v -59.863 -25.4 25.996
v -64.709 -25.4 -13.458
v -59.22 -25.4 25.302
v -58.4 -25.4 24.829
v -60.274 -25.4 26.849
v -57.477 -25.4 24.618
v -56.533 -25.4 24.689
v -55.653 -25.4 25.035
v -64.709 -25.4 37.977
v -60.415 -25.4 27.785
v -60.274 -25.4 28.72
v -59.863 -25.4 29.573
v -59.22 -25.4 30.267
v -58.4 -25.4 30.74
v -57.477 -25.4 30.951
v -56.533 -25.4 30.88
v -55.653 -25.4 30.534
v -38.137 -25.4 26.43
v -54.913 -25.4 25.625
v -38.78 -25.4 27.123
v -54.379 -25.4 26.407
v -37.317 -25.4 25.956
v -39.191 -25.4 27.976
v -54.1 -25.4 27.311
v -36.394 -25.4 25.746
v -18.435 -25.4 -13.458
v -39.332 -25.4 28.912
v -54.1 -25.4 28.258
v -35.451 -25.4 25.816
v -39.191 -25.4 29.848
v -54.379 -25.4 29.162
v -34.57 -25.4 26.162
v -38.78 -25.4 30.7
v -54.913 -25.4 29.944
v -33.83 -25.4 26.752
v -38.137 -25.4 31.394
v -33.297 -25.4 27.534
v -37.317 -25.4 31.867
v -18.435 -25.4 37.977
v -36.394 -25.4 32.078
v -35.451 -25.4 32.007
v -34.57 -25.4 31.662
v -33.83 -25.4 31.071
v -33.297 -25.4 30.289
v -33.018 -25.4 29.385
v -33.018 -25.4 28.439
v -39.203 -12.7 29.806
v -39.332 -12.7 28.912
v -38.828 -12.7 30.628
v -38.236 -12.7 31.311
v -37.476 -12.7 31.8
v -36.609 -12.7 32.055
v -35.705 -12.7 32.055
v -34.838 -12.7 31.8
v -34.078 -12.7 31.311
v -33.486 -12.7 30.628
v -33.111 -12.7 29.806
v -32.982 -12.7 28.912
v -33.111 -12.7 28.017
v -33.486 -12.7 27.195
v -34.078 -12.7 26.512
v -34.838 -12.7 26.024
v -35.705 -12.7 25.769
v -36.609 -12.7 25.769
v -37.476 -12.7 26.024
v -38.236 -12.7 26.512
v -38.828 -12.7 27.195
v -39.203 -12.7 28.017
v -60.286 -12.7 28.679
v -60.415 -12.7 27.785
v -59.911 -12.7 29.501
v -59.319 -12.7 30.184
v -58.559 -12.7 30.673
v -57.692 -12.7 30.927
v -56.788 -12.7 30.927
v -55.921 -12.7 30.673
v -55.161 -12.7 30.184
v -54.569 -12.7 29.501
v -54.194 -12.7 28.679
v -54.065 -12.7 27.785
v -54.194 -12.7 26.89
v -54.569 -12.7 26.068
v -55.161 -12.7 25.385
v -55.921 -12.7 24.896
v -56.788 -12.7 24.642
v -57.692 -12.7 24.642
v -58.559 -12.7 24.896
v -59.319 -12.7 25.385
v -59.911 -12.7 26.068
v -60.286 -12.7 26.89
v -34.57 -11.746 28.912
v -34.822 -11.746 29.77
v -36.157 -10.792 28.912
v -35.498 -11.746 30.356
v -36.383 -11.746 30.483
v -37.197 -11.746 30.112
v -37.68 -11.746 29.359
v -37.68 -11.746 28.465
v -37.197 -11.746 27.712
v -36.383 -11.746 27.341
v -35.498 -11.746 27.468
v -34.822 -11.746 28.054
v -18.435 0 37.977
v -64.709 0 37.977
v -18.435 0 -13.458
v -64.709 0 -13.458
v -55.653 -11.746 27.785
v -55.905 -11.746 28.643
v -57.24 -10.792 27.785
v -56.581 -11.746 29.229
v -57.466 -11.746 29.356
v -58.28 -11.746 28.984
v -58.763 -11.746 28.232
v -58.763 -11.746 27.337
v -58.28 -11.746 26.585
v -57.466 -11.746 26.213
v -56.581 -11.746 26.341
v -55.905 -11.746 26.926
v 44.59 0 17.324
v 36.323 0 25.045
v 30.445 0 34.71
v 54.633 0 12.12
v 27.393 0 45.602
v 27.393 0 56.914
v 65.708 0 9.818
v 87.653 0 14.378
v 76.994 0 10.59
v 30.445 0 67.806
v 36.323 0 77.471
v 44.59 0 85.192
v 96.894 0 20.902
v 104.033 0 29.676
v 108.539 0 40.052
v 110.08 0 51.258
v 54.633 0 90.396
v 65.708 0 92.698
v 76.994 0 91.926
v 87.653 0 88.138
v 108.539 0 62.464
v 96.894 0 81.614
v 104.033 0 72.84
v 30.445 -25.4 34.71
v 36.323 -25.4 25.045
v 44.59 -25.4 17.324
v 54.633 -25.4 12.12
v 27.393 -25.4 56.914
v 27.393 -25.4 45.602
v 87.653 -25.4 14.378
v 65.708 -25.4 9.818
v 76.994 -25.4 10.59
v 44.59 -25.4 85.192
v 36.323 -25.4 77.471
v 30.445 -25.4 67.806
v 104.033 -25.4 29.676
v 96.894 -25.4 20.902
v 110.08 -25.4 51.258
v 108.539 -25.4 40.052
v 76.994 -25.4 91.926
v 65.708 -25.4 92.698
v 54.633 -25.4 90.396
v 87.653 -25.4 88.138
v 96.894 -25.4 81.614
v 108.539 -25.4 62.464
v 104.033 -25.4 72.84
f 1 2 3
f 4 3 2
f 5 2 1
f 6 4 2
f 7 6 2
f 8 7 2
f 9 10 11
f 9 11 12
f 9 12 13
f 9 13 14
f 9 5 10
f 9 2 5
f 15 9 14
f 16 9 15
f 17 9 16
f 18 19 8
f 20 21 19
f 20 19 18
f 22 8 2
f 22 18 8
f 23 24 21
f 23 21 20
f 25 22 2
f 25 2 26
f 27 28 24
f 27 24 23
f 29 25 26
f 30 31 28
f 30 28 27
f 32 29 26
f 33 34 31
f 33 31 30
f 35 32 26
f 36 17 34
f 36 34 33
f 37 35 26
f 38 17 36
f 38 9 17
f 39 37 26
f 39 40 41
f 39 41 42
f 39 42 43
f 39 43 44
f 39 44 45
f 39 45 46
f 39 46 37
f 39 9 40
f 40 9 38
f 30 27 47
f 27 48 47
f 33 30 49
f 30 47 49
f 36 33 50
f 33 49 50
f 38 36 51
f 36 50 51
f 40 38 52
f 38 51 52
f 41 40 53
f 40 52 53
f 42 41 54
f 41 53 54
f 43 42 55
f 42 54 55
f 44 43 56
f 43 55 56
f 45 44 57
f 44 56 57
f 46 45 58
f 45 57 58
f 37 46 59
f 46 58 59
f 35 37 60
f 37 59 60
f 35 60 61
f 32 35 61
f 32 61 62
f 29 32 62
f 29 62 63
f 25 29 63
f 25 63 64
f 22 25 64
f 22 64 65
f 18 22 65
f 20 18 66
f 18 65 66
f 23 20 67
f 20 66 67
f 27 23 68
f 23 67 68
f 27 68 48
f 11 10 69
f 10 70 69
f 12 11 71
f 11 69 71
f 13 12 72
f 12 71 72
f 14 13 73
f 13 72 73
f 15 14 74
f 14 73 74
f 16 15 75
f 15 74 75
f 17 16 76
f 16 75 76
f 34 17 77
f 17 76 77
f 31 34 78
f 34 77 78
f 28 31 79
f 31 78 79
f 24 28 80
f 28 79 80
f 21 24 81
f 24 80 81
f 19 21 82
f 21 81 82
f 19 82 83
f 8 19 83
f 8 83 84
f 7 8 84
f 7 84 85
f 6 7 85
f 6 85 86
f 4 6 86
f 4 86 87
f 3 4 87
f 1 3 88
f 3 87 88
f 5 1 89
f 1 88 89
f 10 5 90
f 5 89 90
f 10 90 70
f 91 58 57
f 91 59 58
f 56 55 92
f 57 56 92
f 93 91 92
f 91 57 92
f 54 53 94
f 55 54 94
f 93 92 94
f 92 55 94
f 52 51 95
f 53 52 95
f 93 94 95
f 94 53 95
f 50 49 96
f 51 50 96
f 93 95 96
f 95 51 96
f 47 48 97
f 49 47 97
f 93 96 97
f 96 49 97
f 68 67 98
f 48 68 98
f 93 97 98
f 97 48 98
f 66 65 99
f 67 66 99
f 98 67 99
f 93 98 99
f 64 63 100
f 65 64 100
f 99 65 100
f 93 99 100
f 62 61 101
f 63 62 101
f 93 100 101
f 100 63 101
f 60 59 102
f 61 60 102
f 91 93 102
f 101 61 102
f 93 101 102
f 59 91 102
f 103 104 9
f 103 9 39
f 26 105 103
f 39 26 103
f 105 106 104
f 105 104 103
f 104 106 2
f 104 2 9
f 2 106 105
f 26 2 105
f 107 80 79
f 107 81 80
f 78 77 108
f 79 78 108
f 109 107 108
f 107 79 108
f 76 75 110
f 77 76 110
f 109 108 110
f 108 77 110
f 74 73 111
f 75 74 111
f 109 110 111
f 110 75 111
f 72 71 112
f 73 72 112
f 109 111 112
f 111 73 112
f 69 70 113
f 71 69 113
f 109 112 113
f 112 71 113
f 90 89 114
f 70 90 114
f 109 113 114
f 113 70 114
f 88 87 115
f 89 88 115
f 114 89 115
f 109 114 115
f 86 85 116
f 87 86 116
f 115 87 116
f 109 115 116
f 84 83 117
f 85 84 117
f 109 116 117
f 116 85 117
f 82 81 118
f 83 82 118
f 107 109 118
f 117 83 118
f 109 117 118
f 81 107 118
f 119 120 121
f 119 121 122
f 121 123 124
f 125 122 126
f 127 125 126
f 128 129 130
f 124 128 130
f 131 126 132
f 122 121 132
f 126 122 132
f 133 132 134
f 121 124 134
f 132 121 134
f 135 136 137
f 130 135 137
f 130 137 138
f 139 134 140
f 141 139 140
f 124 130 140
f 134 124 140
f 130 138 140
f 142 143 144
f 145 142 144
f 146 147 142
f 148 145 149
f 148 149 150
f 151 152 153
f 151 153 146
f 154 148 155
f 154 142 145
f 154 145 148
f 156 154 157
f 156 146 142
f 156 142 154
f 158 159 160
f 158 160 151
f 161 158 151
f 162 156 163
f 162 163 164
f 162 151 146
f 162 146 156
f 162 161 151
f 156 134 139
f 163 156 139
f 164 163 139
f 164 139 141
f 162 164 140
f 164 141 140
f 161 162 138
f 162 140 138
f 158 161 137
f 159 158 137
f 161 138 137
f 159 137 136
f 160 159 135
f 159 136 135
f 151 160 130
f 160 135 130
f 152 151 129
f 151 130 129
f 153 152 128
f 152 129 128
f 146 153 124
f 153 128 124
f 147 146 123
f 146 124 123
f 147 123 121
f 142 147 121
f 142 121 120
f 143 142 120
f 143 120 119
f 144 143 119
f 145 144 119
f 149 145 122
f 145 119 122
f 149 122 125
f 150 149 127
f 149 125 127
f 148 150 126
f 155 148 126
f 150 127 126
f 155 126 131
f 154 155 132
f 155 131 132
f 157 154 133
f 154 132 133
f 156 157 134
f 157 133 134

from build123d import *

# Parameters (mm, degrees)
F0_W     = 46.2730694562
F0_H     = 51.4349984005
F1_DEPTH = 25.4
F3_D     = 6.35
F3_DEPTH = 12.7
F3_TIP   = 1.9077324654
F4_R     = 41.5364849157
F5_DEPTH = 25.4


with BuildPart() as f1:
    # F0 (on Front) → F1 (new body)
    with BuildSketch(Plane.XZ):
        with Locations((-41.5720185265, 12.2595964931)):
            Rectangle(F0_W, F0_H)
    extrude(amount=F1_DEPTH)

    # F3
    with Locations(Plane.XZ.offset(25.4)):
        with Locations((-57.2400018573, 27.7845785022), (-36.157079041, 28.91189605)):
            Hole(F3_D / 2, depth=F3_DEPTH)
            with Locations((0, 0, -(F3_DEPTH + F3_TIP / 2))):  # 118° drill point
                Cone(0, F3_D / 2, F3_TIP, mode=Mode.SUBTRACT)


with BuildPart() as f5:
    # F4 (on Front) → F5 (new body)
    with BuildSketch(Plane.XZ):
        with Locations((68.5430243611, 51.2580573559)):
            Circle(F4_R)
    extrude(amount=F5_DEPTH)


solid = Compound([f1.part, f5.part])
